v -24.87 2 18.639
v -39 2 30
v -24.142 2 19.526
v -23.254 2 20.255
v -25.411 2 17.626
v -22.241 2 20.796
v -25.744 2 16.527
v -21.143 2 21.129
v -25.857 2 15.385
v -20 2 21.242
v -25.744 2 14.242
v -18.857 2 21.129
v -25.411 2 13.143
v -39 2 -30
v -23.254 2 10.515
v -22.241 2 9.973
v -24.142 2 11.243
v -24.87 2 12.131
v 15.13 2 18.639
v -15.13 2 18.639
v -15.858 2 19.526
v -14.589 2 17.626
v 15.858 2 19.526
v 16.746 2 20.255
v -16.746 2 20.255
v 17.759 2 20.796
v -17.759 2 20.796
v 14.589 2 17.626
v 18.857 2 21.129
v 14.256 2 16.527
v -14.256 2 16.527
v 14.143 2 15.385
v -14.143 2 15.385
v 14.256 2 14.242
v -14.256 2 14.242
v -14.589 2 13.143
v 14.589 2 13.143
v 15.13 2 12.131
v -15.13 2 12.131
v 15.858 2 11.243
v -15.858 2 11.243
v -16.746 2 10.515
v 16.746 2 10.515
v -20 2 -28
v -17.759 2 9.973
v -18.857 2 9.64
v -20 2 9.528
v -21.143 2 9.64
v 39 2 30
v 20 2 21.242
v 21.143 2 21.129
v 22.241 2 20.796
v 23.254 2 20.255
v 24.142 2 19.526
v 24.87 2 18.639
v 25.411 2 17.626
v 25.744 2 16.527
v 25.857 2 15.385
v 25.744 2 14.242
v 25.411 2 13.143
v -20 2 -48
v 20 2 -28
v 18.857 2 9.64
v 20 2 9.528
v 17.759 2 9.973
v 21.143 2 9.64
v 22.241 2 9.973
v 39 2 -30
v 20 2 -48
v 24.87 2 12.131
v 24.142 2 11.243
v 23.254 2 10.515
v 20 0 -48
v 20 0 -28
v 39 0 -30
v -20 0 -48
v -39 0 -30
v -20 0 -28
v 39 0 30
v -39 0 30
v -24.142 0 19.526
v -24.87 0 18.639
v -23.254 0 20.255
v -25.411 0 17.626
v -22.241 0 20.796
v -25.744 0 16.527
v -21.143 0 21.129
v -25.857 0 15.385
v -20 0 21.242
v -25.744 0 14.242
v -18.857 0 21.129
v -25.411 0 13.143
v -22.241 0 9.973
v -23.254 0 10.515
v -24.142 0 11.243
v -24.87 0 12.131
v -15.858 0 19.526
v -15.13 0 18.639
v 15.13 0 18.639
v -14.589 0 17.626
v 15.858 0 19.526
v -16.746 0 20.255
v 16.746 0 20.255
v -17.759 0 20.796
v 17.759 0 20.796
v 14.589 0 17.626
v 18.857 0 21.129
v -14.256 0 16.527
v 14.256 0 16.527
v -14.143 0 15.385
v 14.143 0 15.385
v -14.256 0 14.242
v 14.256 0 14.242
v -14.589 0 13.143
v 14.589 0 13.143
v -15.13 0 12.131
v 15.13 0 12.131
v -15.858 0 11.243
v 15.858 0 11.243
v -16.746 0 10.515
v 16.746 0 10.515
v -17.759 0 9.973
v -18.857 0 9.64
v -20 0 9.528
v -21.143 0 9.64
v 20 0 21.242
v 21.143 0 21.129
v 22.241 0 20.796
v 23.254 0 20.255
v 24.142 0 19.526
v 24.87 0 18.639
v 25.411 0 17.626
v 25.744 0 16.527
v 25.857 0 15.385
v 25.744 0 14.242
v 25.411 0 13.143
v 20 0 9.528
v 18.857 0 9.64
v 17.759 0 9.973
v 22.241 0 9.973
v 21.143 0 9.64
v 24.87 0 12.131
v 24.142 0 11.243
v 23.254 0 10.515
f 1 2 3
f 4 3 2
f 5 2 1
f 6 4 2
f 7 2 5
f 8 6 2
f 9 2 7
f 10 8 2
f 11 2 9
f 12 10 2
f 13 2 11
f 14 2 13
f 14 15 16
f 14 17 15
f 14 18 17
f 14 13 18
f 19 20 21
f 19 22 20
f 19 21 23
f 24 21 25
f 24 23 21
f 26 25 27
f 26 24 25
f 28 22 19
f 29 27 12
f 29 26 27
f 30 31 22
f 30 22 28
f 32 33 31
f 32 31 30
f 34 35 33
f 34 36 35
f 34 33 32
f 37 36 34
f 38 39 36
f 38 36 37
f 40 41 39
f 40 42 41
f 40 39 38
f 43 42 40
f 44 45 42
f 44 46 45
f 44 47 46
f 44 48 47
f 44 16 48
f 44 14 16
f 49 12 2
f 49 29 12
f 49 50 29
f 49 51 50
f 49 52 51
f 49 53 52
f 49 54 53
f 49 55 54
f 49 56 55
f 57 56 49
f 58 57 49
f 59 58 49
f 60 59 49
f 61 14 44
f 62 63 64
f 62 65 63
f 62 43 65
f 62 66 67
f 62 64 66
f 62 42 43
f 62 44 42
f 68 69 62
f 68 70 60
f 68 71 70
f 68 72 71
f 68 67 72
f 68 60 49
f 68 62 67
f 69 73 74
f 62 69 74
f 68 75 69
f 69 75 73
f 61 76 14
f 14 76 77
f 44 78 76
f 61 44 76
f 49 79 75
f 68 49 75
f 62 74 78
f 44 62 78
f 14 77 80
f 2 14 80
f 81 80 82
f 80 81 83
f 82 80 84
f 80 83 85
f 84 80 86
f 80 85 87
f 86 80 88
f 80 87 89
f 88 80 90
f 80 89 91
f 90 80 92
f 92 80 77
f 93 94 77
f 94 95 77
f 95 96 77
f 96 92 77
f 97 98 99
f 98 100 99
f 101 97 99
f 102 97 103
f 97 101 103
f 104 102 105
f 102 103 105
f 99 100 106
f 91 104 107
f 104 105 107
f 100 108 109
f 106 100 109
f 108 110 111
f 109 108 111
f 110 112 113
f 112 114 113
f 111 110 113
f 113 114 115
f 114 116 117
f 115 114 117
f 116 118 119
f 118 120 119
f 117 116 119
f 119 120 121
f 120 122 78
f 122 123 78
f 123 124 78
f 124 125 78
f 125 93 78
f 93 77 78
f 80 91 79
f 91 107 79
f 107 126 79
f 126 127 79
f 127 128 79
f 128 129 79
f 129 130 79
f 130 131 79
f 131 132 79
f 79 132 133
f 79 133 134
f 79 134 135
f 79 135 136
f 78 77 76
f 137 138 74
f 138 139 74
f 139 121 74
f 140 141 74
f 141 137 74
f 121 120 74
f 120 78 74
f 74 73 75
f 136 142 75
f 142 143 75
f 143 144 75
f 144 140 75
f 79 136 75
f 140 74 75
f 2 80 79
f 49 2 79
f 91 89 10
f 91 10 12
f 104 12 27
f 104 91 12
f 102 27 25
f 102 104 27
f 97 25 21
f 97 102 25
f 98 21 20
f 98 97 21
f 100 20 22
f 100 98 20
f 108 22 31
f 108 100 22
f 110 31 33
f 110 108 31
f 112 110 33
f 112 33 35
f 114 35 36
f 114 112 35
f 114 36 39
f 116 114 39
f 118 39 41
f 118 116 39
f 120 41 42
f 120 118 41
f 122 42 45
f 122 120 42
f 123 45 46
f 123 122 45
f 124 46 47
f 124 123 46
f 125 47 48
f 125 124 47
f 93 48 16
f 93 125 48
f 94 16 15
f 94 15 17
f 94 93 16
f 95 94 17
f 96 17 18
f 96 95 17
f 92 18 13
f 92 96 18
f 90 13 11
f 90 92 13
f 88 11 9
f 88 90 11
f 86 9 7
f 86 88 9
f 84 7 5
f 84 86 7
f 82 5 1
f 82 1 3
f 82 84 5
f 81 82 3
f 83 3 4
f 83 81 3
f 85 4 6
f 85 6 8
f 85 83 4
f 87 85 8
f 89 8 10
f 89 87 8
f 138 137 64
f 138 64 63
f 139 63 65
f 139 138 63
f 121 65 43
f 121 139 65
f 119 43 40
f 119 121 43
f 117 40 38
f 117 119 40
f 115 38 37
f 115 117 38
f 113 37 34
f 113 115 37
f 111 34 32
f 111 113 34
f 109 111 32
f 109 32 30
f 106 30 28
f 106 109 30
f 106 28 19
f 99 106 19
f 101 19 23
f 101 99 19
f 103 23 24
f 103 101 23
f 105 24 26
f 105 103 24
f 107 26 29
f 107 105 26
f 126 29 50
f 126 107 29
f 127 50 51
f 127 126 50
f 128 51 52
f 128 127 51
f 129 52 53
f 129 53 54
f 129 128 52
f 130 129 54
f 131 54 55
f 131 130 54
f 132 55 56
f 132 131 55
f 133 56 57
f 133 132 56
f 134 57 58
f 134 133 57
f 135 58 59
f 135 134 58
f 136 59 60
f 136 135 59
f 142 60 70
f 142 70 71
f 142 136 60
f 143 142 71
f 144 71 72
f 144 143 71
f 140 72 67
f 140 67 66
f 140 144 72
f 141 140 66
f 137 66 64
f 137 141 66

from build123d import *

# Parameters (mm, degrees)
ESBO_O1_R                = 5.857023813
RESSALTO_EXTRUS_O1_DEPTH = 2


with BuildPart() as part:
    # Esboço1 → Ressalto-extrusão1 (new body)
    with BuildSketch(Plane(origin=(0, 0, 0), x_dir=(1, 0, 0), z_dir=(0, 1, 0))):
        Polygon((-20, 48), (-39, 30), (-39, -30), (39, -30), (39, 30), (20, 48), (20, 28), (-20, 28), align=None)
        with Locations(Location((-20, -15.384615385, 0), (0, 0, 270))):
            Circle(ESBO_O1_R, mode=Mode.SUBTRACT)
        with Locations(Location((20, -15.384615385, 0), (0, 0, 90))):
            Circle(ESBO_O1_R, mode=Mode.SUBTRACT)
    extrude(amount=RESSALTO_EXTRUS_O1_DEPTH)


solid = part.part
